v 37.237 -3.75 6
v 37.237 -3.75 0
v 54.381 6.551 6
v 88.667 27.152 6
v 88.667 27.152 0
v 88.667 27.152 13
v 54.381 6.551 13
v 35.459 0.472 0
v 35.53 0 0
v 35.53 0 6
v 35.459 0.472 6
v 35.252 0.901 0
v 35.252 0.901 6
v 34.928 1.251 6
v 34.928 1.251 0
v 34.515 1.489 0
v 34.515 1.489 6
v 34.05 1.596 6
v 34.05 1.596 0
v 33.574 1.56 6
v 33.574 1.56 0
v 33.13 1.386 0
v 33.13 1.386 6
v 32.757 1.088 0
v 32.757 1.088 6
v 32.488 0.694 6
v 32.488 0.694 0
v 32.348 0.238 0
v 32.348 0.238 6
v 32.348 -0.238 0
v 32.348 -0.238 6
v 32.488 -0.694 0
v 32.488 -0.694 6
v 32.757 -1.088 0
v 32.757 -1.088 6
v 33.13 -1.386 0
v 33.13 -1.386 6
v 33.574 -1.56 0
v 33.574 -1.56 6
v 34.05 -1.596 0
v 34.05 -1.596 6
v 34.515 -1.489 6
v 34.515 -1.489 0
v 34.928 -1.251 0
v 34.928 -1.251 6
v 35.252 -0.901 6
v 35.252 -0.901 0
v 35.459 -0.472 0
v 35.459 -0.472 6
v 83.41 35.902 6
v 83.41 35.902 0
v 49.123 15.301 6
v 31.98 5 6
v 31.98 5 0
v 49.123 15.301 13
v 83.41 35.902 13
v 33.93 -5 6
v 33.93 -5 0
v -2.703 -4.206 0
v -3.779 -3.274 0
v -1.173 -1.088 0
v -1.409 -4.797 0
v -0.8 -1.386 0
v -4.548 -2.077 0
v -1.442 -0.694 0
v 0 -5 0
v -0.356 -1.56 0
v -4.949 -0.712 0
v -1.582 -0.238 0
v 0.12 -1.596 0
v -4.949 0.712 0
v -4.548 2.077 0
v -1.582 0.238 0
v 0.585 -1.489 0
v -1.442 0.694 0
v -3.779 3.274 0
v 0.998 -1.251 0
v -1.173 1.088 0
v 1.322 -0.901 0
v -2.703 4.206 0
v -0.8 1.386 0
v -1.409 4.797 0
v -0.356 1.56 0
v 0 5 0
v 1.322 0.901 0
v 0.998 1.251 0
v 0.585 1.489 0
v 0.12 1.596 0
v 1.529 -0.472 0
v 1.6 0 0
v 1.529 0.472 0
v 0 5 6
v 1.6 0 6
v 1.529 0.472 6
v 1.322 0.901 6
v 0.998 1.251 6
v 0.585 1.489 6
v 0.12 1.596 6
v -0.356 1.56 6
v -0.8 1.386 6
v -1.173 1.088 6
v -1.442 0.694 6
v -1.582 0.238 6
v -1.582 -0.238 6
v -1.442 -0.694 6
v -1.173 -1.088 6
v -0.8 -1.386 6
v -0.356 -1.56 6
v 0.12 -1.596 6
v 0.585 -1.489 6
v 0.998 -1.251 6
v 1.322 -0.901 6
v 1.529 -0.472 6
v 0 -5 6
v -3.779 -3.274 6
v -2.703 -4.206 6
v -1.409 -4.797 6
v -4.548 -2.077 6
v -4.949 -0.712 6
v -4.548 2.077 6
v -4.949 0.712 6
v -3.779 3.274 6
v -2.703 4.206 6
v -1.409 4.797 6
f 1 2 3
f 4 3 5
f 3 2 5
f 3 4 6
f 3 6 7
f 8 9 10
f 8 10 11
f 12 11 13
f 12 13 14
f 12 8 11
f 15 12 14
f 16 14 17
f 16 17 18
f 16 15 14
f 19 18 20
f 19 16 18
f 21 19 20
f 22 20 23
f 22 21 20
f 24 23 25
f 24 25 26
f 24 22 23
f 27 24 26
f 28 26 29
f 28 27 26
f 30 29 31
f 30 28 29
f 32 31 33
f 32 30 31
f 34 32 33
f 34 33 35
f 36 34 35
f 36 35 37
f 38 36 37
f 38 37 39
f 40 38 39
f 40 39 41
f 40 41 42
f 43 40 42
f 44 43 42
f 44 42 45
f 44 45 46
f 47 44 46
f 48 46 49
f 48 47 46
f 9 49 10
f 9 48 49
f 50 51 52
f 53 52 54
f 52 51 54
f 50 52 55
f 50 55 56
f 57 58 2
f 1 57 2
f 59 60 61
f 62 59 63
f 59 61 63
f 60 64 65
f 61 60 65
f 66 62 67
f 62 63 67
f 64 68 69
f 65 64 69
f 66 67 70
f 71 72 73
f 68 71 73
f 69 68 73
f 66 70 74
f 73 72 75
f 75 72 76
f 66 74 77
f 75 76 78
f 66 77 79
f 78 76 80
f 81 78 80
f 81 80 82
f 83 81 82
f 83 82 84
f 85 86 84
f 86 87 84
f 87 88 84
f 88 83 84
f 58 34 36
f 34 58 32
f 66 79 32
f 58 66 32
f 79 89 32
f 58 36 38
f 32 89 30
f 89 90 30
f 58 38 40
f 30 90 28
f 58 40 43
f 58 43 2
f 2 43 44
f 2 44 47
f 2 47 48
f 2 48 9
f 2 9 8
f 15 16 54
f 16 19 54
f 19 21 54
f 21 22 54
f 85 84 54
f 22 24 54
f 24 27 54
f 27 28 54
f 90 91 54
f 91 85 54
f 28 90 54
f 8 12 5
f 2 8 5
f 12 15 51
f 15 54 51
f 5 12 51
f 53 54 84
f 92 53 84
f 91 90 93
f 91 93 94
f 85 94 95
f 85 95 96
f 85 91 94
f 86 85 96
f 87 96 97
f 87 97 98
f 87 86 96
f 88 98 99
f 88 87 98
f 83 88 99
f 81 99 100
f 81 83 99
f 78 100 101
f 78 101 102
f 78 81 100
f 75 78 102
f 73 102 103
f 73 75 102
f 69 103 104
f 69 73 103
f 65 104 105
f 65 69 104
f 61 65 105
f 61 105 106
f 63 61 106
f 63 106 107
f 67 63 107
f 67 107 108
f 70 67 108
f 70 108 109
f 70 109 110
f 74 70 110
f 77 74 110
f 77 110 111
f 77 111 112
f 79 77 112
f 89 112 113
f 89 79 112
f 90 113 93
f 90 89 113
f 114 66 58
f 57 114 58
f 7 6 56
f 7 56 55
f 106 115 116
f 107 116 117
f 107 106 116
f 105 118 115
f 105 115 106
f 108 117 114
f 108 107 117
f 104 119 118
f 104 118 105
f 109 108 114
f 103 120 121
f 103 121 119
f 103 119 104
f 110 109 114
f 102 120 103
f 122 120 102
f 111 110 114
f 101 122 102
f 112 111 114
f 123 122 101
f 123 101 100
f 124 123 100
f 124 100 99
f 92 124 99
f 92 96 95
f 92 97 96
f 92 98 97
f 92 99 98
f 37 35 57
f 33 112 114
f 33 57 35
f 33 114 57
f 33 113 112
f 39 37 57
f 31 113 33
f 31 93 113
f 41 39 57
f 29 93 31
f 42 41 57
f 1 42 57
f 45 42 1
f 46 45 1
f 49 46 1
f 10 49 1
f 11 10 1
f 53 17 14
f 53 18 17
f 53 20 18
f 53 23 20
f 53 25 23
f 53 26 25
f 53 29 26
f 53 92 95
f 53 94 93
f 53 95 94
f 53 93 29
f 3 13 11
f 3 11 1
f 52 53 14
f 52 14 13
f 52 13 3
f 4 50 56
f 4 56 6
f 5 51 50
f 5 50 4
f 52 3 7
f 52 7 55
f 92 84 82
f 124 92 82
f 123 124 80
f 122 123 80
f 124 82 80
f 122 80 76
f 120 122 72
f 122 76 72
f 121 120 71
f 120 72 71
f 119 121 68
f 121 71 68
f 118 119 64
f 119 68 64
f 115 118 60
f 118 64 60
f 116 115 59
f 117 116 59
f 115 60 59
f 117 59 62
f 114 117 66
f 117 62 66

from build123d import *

# Parameters (mm, degrees)
SKETCH1_R               = 1.6
BOSS_EXTRUDE1_DEPTH     = 6
SALIENTE_EXTRUIR1_DEPTH = 7


with BuildPart() as part:
    # Sketch1 → Boss-Extrude1 (new body)
    # profile 1 of 2: a face of its own
    with BuildSketch(Plane.XY):
        with BuildLine():
            Line((31.98, 5), (0, 5))
            ThreePointArc((0, 5), (-5, 0), (0, -5))
            Line((0, -5), (33.93, -5))
            Line((33.93, -5), (37.237412205, -3.749803263))
            ThreePointArc((37.237412205, -3.749803263), (38.607019153, 1.767906062), (33.93, 5))
            Line((33.93, 5), (31.98, 5))
        make_face()
        Circle(SKETCH1_R, mode=Mode.SUBTRACT)
        with Locations((33.93, 0)):
            Circle(SKETCH1_R, mode=Mode.SUBTRACT)
    # profile 2 of 2: a face of its own
    with BuildSketch(Plane.XY):
        with BuildLine():
            Line((83.410038042, 35.902284495), (31.98, 5))
            Line((31.98, 5), (33.93, 5))
            ThreePointArc((33.93, 5), (38.607019153, 1.767906062), (37.237412205, -3.749803263))
            Line((37.237412205, -3.749803263), (88.667450247, 27.152481232))
            Line((88.667450247, 27.152481232), (83.410038042, 35.902284495))
        make_face()
    extrude(amount=BOSS_EXTRUDE1_DEPTH)

    # Croquis3 → Saliente-Extruir1 (add)
    with BuildSketch(Plane.XY.offset(6)):
        Polygon((83.410038042, 35.902284495), (88.667450247, 27.152481232), (54.380758219, 6.550958236), (49.123346014, 15.300761498), align=None)
    extrude(amount=SALIENTE_EXTRUIR1_DEPTH)


solid = part.part
